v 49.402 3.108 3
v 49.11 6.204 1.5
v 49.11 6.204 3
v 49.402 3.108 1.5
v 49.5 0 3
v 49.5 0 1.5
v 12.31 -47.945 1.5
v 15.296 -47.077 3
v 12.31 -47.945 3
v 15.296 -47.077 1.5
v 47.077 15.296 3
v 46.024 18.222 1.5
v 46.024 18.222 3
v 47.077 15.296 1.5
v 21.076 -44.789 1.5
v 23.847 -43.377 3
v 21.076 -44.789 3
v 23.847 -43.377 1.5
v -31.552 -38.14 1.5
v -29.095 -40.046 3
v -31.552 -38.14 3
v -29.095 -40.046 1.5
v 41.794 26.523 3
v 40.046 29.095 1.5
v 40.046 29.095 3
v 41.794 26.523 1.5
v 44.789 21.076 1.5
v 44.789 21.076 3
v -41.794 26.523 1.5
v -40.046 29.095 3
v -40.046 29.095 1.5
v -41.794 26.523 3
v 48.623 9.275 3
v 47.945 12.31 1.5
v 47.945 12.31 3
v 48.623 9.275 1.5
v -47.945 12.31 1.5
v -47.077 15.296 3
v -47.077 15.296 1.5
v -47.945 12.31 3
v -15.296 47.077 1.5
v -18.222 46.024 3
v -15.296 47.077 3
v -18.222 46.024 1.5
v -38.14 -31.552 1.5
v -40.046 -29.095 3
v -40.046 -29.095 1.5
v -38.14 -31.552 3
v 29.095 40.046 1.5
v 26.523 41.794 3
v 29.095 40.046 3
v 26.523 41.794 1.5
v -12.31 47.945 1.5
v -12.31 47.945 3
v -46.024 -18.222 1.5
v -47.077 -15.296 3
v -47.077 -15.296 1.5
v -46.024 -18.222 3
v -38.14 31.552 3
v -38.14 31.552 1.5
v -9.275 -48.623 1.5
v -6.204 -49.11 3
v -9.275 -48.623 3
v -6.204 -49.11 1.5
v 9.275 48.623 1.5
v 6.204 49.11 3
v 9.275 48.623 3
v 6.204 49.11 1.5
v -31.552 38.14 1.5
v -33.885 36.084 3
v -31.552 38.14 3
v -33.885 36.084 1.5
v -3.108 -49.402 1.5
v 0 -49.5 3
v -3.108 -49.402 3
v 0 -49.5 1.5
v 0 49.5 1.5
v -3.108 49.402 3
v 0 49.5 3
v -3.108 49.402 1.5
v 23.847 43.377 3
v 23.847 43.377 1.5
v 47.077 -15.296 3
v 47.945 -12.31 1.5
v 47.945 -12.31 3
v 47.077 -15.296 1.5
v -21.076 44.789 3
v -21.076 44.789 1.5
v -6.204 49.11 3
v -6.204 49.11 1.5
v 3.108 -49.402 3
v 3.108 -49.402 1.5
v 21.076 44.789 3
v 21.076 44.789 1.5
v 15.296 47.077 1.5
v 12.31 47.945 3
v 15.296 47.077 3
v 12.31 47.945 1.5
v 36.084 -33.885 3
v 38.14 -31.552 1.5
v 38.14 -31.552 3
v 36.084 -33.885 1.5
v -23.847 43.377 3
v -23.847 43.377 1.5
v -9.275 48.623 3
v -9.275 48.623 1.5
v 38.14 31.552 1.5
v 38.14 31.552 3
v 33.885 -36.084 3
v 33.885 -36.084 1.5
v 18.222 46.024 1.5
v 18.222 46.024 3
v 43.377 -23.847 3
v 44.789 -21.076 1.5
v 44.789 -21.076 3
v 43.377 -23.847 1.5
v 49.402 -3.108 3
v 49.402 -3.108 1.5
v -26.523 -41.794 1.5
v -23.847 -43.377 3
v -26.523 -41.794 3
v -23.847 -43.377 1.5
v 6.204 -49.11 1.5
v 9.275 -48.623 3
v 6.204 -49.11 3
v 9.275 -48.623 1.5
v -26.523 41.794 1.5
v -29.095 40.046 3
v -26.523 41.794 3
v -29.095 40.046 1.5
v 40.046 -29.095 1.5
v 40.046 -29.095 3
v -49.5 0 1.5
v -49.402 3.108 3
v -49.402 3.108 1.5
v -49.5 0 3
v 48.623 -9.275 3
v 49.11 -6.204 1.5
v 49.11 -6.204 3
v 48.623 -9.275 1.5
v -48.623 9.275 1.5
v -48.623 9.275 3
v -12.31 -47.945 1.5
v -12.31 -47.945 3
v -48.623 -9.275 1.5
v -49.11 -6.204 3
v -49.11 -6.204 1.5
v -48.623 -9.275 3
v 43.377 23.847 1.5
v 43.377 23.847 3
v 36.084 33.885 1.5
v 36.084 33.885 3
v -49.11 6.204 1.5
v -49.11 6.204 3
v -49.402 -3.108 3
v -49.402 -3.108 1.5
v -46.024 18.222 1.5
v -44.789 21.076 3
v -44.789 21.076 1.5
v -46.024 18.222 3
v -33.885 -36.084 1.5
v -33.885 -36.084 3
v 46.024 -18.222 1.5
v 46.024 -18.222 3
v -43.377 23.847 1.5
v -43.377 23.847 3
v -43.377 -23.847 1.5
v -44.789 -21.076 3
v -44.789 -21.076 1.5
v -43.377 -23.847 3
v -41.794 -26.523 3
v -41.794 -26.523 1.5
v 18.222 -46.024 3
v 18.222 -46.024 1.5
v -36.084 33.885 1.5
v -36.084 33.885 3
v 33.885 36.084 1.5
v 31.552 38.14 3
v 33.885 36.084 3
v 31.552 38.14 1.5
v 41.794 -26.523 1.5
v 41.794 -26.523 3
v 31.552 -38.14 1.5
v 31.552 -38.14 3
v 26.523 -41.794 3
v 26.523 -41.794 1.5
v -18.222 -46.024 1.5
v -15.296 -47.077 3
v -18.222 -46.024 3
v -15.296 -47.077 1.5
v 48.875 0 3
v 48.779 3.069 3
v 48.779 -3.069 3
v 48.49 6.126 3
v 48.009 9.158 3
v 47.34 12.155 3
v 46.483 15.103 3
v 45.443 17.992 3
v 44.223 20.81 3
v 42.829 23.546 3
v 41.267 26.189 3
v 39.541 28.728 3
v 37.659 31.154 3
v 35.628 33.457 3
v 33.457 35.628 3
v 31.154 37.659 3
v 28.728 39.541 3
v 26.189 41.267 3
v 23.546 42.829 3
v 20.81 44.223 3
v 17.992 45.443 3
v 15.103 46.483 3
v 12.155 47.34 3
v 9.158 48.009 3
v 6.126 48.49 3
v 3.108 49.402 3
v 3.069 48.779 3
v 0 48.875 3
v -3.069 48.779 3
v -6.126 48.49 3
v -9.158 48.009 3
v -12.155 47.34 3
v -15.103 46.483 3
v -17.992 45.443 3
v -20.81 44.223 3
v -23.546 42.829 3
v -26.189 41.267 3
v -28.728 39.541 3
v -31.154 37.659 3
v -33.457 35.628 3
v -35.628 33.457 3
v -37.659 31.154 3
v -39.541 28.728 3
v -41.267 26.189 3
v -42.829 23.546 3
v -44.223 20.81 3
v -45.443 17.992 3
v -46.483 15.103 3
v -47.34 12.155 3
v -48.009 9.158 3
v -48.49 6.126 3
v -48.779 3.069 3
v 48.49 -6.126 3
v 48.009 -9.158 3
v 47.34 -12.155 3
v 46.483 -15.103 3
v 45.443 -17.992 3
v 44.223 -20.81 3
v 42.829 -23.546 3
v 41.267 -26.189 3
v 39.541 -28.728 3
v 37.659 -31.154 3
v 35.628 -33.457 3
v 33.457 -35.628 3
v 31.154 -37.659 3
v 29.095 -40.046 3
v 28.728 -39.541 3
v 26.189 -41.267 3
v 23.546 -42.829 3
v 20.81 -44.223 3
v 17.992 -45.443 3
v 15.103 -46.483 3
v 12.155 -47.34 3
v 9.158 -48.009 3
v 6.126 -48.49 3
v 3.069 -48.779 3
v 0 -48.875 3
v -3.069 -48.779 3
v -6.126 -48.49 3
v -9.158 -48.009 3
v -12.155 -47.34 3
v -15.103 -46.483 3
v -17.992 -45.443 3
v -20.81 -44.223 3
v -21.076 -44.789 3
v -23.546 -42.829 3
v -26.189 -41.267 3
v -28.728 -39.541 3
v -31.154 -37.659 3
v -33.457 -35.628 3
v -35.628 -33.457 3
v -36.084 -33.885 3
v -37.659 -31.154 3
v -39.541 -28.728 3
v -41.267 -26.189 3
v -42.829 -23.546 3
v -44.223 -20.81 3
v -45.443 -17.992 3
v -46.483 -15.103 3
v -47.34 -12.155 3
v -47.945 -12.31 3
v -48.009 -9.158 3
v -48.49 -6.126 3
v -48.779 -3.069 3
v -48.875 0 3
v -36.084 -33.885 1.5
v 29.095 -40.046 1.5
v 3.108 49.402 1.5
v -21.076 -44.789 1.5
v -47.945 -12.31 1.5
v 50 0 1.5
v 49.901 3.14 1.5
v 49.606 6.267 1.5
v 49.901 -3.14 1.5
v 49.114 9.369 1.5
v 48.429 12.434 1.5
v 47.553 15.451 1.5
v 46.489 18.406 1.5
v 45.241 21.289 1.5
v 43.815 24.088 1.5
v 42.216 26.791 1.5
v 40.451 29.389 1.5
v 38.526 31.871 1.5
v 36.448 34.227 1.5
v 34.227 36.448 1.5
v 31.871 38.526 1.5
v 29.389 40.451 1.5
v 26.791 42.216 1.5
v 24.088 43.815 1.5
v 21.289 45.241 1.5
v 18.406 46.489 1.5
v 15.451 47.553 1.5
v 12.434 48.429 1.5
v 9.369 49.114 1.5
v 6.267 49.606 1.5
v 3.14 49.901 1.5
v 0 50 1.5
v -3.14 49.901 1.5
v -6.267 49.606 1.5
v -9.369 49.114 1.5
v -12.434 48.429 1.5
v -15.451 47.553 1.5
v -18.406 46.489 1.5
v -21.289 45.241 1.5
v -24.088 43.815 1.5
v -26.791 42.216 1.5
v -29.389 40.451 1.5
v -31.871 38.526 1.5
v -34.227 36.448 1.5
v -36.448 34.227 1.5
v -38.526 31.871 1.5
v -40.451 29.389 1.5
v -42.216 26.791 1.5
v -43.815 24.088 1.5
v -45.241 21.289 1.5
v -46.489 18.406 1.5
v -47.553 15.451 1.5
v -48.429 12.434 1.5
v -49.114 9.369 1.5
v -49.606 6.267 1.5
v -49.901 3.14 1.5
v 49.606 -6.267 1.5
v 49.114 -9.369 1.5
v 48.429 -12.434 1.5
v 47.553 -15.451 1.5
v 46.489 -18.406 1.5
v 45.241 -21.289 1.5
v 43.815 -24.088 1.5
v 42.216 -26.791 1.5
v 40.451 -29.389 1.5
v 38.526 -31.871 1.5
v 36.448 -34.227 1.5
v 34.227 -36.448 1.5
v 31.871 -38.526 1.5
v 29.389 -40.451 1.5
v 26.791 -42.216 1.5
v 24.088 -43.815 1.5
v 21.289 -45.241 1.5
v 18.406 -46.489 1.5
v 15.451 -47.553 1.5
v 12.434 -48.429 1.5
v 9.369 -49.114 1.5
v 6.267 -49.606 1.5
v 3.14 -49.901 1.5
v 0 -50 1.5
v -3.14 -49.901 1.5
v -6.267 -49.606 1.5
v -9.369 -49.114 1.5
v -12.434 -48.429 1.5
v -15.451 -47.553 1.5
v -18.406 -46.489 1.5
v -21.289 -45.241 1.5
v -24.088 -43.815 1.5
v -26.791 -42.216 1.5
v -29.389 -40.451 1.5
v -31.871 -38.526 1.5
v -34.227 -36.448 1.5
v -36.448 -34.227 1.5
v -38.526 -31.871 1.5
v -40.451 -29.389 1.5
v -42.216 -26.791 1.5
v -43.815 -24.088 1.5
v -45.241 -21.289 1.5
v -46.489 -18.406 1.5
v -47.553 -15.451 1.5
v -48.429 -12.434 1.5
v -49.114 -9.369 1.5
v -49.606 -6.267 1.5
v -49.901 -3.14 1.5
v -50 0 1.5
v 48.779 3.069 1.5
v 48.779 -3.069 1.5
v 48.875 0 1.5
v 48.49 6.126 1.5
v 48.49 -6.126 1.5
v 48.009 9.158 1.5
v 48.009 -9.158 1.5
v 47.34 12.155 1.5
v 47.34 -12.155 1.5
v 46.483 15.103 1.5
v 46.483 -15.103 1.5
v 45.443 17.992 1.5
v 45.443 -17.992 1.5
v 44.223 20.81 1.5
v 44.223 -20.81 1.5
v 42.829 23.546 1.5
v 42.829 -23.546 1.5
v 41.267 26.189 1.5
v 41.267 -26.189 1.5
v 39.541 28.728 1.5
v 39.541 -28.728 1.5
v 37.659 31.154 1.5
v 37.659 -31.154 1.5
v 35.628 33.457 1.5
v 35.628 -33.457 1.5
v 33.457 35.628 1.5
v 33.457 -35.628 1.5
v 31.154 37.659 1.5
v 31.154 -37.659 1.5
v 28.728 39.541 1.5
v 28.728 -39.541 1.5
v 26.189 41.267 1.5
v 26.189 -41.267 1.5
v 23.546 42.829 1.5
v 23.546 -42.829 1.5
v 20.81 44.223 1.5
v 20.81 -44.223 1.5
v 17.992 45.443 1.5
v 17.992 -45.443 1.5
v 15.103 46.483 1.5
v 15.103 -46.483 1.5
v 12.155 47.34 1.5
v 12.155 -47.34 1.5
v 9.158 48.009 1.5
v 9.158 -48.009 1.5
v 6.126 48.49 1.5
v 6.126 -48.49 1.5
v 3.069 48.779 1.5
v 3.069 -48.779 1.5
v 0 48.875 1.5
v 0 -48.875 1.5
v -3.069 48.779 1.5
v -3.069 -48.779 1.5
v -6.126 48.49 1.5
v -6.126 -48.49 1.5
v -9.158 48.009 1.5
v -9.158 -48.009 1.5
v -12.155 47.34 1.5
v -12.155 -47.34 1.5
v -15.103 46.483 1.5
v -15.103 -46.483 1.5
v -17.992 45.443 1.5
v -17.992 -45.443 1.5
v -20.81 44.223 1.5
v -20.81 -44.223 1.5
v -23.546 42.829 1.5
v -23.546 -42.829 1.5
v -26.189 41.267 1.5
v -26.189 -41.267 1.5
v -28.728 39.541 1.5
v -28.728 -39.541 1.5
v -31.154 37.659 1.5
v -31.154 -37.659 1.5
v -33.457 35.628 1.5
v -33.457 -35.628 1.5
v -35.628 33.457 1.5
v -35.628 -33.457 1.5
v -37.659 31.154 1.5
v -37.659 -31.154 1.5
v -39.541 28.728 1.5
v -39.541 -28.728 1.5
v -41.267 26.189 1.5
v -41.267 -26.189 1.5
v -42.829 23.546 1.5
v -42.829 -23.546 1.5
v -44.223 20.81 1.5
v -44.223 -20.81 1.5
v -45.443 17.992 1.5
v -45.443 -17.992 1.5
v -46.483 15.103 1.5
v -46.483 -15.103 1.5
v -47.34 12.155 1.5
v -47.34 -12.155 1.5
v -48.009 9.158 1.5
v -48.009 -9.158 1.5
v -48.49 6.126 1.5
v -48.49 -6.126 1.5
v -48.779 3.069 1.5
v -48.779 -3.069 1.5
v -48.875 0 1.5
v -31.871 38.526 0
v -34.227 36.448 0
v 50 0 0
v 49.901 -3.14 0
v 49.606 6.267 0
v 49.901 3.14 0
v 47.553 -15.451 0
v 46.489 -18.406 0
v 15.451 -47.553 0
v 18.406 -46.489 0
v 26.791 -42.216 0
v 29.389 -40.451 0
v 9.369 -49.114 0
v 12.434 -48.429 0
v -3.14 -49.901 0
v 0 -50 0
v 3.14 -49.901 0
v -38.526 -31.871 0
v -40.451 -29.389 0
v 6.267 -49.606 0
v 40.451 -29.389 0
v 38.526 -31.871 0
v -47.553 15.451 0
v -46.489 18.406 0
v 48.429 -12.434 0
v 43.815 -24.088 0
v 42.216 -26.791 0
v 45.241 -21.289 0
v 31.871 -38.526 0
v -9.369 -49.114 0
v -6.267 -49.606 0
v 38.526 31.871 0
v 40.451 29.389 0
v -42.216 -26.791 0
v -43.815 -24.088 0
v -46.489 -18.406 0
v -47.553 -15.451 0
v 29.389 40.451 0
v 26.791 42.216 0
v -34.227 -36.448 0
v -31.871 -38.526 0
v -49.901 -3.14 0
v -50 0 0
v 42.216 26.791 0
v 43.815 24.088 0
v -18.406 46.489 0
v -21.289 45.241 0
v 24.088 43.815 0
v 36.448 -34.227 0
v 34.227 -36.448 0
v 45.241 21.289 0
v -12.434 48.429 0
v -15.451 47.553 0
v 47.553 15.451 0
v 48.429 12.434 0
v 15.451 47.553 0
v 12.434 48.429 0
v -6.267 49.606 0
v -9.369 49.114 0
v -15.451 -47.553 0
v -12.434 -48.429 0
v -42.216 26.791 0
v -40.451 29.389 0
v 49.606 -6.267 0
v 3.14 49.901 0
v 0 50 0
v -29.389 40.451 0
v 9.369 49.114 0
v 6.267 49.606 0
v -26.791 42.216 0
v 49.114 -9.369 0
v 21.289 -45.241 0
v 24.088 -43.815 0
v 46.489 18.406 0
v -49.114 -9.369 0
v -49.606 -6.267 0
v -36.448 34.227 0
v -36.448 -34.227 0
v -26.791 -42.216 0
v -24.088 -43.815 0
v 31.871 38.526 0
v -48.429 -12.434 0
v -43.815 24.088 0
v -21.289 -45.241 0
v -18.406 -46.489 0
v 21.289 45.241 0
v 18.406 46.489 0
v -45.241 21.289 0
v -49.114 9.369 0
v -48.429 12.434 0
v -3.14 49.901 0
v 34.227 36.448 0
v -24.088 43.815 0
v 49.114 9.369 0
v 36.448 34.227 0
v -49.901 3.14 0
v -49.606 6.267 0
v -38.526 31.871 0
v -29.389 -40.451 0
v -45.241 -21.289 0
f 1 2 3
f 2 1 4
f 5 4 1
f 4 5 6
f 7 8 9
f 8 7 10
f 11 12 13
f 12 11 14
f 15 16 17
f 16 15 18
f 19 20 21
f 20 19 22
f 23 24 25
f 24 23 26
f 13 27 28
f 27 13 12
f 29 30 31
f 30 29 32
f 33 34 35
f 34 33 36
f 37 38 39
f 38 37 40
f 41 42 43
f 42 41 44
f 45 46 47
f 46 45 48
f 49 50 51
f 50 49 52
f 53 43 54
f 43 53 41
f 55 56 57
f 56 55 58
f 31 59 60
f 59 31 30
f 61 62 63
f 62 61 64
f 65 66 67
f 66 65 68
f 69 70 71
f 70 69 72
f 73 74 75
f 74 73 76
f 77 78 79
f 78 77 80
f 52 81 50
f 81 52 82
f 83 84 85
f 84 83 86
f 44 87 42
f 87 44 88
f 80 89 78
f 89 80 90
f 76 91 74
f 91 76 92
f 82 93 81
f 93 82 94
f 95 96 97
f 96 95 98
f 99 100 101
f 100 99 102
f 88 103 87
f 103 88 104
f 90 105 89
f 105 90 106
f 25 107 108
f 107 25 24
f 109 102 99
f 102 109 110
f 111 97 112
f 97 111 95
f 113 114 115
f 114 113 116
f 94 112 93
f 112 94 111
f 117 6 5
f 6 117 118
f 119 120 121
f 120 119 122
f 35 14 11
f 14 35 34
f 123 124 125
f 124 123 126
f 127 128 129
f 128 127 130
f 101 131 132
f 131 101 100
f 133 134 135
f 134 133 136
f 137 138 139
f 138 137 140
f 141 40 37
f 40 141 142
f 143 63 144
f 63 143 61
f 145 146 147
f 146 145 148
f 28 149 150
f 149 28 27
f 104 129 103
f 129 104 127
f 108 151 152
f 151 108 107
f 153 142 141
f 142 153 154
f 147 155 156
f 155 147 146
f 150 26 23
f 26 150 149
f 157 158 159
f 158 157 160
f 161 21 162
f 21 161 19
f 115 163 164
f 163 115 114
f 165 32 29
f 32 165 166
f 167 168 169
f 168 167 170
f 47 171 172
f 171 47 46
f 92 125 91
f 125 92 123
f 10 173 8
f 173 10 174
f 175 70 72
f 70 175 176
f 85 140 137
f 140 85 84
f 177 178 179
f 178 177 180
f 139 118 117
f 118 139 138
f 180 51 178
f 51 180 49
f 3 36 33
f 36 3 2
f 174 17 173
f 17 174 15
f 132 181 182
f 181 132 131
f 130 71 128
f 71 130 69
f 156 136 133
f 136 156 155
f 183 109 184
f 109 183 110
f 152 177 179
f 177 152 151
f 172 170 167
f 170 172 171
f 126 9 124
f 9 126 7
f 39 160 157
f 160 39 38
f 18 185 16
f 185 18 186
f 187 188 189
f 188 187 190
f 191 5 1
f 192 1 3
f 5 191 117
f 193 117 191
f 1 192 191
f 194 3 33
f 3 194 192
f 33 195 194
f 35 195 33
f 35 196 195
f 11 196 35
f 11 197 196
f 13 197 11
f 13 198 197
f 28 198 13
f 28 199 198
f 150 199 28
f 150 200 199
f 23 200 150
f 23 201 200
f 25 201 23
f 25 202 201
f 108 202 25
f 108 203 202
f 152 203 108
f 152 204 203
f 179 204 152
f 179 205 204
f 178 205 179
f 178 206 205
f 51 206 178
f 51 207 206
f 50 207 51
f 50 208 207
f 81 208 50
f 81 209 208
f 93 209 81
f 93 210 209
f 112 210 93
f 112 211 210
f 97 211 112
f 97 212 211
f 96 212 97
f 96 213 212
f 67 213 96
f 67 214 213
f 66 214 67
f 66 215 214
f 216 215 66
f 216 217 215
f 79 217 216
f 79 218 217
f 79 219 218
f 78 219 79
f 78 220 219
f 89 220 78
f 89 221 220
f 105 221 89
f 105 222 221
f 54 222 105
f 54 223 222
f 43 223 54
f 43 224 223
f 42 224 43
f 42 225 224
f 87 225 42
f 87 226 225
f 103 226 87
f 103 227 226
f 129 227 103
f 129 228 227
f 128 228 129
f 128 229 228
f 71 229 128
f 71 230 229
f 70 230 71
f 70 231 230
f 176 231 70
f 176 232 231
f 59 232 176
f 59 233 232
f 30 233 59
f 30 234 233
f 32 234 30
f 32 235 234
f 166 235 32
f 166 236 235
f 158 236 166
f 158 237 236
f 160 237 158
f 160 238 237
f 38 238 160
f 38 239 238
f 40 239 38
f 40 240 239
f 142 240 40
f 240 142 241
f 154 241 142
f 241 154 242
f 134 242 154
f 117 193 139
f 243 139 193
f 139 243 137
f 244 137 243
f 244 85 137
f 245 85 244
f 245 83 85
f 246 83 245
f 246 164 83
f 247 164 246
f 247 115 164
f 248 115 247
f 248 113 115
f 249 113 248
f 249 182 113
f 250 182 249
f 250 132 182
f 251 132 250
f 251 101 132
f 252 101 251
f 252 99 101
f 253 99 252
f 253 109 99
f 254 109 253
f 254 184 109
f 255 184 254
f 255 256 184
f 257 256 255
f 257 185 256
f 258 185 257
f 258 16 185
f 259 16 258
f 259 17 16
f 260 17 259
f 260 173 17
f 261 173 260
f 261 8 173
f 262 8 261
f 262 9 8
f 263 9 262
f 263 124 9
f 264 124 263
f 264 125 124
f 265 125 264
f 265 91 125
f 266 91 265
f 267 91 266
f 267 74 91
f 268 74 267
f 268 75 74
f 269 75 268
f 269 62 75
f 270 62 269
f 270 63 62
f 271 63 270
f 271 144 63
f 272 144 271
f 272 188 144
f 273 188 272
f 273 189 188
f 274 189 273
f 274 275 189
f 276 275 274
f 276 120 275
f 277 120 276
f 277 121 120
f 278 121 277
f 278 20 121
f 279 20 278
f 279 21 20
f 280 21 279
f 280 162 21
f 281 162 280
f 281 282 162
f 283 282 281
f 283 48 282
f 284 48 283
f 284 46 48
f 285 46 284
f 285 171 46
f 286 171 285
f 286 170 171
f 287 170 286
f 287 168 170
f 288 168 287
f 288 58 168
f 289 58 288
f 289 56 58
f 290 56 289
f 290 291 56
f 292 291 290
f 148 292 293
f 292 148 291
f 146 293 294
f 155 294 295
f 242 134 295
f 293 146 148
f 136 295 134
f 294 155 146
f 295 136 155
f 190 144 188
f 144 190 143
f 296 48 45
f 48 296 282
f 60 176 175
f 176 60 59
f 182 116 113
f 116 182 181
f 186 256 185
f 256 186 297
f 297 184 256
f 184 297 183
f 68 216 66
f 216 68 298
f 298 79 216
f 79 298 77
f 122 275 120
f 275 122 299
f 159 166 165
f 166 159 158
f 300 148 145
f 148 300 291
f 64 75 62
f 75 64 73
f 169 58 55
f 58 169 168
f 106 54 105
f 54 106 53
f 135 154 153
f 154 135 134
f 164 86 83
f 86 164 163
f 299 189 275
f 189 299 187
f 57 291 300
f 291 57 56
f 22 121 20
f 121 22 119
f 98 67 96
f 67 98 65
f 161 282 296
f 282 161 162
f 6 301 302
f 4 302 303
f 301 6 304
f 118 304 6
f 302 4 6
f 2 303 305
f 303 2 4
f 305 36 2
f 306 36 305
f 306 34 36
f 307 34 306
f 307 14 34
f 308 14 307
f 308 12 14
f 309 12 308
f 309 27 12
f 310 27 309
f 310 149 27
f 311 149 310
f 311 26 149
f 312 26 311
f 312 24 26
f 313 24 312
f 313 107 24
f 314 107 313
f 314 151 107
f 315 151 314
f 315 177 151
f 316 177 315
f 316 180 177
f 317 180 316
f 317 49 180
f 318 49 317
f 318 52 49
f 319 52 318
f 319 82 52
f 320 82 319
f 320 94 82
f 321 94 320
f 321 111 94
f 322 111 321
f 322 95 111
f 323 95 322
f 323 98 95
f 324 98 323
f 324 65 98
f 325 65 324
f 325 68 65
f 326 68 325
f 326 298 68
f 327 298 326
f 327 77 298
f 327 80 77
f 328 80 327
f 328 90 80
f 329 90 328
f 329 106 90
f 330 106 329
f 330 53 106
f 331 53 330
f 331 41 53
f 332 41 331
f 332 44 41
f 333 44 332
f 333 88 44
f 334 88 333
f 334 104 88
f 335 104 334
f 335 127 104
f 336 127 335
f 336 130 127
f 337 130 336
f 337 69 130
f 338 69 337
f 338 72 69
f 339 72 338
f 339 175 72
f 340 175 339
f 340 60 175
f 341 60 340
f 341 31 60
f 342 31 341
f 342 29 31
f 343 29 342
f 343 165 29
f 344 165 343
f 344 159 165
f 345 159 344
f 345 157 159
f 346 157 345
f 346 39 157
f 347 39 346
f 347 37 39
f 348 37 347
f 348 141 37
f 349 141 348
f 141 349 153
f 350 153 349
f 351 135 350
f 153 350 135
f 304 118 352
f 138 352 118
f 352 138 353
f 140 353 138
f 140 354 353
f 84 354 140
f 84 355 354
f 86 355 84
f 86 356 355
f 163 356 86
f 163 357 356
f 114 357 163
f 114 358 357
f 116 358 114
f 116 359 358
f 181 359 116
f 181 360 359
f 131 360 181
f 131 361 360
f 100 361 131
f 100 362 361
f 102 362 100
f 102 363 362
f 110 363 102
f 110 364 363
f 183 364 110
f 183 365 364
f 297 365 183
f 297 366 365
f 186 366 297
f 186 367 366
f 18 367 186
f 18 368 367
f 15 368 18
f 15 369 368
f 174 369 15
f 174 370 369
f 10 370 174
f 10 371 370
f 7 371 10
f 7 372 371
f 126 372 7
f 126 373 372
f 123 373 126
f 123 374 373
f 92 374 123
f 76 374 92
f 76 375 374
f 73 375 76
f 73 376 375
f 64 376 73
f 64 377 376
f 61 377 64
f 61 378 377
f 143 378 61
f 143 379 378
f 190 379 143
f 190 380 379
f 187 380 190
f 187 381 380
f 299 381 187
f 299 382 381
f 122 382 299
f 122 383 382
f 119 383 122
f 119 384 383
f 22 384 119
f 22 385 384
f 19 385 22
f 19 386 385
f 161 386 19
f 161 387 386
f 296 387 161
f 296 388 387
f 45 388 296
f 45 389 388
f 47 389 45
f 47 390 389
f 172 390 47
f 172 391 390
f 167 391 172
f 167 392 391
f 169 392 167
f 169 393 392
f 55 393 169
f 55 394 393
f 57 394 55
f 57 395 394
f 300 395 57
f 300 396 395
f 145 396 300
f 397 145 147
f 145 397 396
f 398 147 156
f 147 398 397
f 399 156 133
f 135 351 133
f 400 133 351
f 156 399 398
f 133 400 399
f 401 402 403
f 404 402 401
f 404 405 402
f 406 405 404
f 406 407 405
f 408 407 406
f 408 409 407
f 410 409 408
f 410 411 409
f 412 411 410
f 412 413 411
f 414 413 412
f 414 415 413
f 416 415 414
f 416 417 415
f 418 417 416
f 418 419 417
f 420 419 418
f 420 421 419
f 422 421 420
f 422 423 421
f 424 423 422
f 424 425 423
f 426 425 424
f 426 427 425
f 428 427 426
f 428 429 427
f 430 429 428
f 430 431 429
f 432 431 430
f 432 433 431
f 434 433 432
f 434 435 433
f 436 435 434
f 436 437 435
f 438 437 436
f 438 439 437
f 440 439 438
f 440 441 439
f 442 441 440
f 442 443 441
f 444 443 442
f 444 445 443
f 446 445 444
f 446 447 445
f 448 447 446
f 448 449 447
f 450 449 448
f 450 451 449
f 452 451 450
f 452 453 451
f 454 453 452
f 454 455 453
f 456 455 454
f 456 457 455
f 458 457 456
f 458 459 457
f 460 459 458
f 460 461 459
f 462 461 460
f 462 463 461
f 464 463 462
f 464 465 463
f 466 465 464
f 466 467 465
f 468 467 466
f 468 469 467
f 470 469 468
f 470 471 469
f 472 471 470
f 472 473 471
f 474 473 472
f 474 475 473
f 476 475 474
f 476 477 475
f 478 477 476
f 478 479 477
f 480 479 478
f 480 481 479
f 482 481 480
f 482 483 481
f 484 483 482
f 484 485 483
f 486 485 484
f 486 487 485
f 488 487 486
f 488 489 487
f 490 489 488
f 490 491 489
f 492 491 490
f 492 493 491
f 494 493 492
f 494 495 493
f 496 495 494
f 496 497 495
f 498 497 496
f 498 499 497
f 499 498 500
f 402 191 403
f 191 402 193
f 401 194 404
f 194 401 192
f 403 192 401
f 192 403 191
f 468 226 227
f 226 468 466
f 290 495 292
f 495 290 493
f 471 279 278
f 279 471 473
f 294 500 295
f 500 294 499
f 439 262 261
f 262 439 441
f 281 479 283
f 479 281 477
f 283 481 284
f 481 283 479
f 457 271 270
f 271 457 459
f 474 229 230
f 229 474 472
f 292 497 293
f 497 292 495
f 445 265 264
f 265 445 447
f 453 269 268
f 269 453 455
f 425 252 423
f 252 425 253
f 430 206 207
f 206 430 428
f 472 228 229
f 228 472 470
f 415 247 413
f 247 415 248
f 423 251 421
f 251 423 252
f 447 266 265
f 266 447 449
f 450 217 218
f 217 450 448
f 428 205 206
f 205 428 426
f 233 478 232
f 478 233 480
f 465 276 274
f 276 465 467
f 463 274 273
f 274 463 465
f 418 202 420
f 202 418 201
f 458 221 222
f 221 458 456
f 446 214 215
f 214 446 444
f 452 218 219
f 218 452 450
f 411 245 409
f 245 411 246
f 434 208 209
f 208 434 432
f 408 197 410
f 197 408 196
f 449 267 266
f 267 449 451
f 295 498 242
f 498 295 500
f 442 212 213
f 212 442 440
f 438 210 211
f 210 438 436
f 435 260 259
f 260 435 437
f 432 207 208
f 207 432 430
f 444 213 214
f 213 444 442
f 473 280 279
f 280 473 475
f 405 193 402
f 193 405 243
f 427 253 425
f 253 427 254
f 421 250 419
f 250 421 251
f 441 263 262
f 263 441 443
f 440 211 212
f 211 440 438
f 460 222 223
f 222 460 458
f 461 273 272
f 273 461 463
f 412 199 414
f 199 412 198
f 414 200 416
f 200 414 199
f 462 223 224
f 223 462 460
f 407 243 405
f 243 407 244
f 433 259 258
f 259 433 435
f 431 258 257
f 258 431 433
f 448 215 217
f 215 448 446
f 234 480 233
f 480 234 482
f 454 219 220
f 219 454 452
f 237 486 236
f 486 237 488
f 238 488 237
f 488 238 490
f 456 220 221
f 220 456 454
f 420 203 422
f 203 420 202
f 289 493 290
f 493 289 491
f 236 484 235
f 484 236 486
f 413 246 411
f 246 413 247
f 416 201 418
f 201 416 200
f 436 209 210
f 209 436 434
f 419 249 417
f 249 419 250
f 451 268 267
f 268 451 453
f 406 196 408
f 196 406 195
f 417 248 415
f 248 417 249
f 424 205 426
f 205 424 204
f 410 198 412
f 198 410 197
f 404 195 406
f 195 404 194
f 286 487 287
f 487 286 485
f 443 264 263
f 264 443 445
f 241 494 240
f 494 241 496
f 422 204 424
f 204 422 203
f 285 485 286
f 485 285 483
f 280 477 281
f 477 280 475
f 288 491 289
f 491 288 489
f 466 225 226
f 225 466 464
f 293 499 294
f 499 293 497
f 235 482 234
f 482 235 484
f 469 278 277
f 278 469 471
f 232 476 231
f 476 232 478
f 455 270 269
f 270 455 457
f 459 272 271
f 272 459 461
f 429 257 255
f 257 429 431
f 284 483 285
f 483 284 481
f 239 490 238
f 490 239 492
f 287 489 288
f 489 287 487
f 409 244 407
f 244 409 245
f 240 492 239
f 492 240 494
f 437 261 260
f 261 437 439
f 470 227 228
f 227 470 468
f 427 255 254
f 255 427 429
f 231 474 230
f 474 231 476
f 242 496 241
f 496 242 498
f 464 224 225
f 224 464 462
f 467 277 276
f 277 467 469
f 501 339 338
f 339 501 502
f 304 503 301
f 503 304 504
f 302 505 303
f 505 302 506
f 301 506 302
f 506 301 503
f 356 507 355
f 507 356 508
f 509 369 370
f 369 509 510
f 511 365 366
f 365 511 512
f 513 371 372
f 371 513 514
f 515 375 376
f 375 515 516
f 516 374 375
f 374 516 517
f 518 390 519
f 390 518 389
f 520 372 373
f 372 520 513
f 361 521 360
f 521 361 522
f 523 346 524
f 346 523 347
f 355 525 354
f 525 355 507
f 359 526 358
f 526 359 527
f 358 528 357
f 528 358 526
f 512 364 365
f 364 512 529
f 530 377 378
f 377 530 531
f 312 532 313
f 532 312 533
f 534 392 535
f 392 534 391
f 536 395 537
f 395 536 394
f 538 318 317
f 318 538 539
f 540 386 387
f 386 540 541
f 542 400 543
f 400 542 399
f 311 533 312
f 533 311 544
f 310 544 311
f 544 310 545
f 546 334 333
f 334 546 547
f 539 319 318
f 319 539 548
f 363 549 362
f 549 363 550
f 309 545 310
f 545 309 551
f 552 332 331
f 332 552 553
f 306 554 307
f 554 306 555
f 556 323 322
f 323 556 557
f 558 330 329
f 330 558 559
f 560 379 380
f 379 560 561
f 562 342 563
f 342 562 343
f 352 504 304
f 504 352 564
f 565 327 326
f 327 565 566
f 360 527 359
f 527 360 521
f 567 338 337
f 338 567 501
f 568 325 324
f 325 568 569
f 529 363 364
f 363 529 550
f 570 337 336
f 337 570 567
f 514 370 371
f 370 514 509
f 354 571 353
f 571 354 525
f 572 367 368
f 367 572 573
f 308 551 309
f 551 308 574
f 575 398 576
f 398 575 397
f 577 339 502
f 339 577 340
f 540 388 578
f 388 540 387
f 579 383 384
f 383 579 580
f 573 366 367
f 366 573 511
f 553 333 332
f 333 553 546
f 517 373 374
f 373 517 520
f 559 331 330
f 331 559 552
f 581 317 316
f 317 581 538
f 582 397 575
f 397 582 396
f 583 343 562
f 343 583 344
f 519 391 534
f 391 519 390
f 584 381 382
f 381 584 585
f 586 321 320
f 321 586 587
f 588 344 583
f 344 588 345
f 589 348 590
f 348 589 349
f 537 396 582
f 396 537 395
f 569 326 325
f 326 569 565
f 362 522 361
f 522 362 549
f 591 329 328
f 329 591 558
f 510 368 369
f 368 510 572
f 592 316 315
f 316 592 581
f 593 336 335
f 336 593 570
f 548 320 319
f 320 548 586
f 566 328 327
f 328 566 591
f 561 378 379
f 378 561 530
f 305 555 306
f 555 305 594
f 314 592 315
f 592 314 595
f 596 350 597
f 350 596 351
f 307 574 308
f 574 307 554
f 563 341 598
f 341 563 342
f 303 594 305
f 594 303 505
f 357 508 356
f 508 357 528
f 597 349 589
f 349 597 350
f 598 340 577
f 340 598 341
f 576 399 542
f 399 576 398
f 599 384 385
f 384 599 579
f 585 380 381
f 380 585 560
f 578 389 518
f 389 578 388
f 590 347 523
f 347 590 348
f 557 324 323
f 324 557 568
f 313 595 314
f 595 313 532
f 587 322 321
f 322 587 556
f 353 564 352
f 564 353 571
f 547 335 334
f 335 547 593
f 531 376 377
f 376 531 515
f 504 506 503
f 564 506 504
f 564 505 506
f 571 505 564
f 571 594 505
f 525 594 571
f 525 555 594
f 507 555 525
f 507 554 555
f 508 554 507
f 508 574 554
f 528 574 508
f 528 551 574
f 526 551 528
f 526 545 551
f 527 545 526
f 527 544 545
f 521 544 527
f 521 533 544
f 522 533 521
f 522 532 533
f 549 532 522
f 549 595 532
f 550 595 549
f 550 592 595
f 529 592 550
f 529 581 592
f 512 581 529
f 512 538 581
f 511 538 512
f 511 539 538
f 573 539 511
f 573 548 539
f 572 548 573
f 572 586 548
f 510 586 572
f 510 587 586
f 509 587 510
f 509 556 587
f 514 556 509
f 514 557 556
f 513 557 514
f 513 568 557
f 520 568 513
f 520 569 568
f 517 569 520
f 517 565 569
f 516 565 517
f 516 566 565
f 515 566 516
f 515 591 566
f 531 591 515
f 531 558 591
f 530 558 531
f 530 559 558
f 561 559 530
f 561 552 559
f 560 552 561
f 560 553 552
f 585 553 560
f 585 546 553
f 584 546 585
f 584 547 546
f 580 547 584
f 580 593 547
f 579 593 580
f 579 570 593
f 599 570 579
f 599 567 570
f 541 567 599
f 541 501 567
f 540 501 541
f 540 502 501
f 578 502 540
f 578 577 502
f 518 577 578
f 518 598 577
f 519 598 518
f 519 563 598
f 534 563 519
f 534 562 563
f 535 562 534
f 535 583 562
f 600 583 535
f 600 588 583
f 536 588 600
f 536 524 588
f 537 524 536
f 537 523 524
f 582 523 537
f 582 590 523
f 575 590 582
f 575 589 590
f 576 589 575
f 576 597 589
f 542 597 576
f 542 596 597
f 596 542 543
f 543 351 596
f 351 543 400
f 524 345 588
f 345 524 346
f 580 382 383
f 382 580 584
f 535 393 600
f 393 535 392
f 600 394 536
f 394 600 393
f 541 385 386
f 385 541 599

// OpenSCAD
// file: caseMeasurements.scad
$fn=100;
inch = 25.4;
caseHeight = 25;
caseDiameter = 100;
caseThickness = .75;
screwR = 1.5;
supportHeight = 5.5;
boardOffsetLength = 0.05 * inch;
boardOffsetWidth = .5;
// main file
include <caseMeasurements.scad>

difference() {
    union() {
        cylinder(d=caseDiameter,h=caseThickness*2);
        render(2) translate([0,0,caseThickness*2]) difference() {
            cylinder(d=caseDiameter - caseThickness - .25,h=caseThickness * 2);
            cylinder(d=caseDiameter - caseThickness * 3,h=caseThickness * 2);
        }
    }
        translate([-caseDiameter/4,5,caseThickness-.05]) rotate([180,0,0]) resize([caseDiameter/2,0,0],auto=true) linear_extrude(caseThickness/2) import("beagle_logo_hdr_bottom.dxf");
        translate([-caseDiameter/4,5,caseThickness-.05]) rotate([180,0,0]) resize([caseDiameter/2,0,0],auto=true) linear_extrude(caseThickness) import("beagle_logo_hdr_middle.dxf");
        translate([-caseDiameter/4,5,caseThickness-.05]) rotate([180,0,0]) resize([caseDiameter/2,0,0],auto=true) linear_extrude(caseThickness*3/2) import("beagle_logo_hdr_top.dxf");

}
